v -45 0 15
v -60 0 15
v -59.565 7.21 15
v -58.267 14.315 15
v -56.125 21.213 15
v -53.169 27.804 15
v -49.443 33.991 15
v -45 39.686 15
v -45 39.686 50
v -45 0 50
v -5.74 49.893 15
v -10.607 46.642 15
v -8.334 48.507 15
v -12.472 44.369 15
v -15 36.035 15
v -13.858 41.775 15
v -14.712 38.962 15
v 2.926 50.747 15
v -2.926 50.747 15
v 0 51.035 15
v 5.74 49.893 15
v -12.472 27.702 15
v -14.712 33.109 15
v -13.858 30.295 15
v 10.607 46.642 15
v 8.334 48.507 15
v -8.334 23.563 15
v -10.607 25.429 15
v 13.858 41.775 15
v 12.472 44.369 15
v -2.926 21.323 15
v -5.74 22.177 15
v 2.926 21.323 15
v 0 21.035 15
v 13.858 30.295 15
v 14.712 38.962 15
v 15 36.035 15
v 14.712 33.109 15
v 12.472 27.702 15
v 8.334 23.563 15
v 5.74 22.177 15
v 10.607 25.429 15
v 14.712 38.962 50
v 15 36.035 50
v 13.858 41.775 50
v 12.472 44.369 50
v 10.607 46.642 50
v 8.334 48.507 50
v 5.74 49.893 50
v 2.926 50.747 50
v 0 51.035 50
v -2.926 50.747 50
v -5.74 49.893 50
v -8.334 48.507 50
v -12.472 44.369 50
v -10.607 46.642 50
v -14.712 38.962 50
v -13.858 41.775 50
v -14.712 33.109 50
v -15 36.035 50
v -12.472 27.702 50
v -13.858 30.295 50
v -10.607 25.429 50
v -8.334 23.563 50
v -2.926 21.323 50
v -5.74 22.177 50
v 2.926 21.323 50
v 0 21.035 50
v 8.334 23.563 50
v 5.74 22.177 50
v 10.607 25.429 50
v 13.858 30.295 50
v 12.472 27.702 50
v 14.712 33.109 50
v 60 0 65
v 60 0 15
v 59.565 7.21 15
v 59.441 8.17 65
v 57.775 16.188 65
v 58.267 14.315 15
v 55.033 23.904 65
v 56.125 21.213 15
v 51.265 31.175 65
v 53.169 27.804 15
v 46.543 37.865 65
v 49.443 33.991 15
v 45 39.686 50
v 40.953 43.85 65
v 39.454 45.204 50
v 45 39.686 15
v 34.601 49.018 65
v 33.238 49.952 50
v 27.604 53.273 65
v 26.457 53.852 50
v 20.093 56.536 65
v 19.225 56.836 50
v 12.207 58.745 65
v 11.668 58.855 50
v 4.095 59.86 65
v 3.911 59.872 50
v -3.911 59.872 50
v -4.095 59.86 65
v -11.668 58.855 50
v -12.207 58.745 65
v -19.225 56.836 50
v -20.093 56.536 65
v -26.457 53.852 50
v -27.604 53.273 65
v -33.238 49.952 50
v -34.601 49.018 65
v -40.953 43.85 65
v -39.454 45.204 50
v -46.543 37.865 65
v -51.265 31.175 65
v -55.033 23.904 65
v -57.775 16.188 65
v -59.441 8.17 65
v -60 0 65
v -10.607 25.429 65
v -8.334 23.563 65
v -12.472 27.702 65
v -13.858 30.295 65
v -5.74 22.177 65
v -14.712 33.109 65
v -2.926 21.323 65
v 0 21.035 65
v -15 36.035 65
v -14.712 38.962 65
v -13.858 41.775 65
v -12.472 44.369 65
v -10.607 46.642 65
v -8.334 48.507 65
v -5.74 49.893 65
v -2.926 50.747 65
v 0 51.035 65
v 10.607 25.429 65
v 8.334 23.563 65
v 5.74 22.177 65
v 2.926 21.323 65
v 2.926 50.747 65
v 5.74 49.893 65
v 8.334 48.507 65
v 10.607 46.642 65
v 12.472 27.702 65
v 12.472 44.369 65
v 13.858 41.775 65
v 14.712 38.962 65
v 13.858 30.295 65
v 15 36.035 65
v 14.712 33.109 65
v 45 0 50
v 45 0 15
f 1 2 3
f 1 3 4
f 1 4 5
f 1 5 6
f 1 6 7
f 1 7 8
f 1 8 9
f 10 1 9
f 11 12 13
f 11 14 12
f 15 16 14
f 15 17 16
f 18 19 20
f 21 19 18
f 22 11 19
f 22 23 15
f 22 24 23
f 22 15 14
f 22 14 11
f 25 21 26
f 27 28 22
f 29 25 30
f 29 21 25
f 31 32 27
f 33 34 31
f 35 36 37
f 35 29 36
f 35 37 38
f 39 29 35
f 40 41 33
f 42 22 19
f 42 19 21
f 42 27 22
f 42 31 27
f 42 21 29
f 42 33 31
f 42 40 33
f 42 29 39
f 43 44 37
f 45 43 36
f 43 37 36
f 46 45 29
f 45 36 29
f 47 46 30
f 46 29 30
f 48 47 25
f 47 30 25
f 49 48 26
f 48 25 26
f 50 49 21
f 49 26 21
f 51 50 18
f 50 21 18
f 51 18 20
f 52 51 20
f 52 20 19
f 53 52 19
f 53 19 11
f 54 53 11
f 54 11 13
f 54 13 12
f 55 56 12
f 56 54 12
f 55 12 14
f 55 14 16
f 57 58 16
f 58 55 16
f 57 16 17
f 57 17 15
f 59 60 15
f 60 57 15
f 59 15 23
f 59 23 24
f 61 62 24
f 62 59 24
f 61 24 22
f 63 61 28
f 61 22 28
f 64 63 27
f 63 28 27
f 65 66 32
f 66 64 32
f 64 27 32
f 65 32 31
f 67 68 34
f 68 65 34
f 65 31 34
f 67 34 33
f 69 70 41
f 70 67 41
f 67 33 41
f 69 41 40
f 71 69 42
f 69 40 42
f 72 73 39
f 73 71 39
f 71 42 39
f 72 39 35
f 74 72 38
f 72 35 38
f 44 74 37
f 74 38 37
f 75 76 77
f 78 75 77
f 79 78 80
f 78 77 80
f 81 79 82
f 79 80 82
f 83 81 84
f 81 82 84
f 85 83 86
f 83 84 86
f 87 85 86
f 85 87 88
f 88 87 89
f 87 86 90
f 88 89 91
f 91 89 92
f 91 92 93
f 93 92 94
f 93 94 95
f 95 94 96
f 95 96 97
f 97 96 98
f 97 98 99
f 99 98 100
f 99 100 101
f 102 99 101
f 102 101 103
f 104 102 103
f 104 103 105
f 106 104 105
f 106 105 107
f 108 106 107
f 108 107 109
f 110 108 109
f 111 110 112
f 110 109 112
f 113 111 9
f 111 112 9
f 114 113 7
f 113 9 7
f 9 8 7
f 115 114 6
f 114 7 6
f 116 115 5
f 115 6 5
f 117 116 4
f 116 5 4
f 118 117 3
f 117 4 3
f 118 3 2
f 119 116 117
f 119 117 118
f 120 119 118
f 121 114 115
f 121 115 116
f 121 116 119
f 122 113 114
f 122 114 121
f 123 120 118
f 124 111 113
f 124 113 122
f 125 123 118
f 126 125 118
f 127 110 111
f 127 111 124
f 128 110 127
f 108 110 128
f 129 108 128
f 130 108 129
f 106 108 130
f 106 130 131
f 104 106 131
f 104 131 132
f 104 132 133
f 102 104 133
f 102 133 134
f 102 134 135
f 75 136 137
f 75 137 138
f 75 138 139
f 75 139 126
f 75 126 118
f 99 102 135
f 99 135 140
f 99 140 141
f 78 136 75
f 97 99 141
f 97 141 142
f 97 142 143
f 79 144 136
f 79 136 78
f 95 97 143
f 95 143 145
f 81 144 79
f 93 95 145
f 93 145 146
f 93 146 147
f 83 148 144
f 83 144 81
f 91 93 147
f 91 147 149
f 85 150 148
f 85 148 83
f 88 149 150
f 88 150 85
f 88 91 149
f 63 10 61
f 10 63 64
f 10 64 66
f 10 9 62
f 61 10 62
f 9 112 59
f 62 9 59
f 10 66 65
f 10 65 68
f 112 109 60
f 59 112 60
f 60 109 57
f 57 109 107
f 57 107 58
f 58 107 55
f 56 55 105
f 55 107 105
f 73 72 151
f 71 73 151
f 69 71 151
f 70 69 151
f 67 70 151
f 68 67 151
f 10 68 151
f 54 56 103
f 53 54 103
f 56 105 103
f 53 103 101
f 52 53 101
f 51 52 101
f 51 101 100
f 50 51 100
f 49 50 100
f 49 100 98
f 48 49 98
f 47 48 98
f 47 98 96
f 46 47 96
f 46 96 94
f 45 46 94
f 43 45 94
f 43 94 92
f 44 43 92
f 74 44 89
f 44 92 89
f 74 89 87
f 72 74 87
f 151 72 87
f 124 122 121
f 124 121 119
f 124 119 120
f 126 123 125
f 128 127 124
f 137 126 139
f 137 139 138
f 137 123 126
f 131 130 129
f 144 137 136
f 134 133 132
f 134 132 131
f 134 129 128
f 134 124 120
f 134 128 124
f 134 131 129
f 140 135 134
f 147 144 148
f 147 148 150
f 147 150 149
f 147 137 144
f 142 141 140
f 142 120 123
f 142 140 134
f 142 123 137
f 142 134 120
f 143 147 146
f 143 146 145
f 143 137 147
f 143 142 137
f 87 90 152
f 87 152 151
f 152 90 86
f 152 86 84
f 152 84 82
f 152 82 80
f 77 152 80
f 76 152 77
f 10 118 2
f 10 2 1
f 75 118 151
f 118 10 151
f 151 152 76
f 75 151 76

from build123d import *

# Parameters (mm, degrees)
BOSS_EXTRUDE1_DEPTH = 65
CUT_EXTRUDE1_START  = -60
SKETCH4_W           = 90
SKETCH4_H           = 35
CUT_EXTRUDE1_DEPTH  = 60
BOSS_EXTRUDE2_START = -50
SKETCH5_R           = 15
BOSS_EXTRUDE2_DEPTH = 50.000012
SKETCH7_W           = 120
SKETCH7_H           = 15
CUT_EXTRUDE3_DEPTH  = 61


with BuildPart() as part:
    # Sketch3 → Boss-Extrude1 (new body)
    with BuildSketch(Plane.XY):
        with BuildLine():
            Line((-60, 0), (60, 0))
            ThreePointArc((60, 0), (0, 60), (-60, 0))
        make_face()
    extrude(amount=BOSS_EXTRUDE1_DEPTH)

    # Sketch4 → Cut-Extrude1 (cut)
    with BuildSketch(Plane.XZ.offset(CUT_EXTRUDE1_START)):
        with Locations((0, 32.5)):
            Rectangle(SKETCH4_W, SKETCH4_H)
    extrude(amount=CUT_EXTRUDE1_DEPTH, mode=Mode.SUBTRACT)

    # Sketch5 → Boss-Extrude2 (add)
    with BuildSketch(Plane.XY.offset(65).offset(BOSS_EXTRUDE2_START)):
        with Locations((0, 36.035216542)):
            Circle(SKETCH5_R)
    extrude(amount=BOSS_EXTRUDE2_DEPTH)

    # Sketch7 → Cut-Extrude3 (cut, through all)
    with BuildSketch(Plane.XZ):
        with Locations((0, 7.5)):
            Rectangle(SKETCH7_W, SKETCH7_H)
    extrude(amount=-CUT_EXTRUDE3_DEPTH, mode=Mode.SUBTRACT)


solid = part.part
